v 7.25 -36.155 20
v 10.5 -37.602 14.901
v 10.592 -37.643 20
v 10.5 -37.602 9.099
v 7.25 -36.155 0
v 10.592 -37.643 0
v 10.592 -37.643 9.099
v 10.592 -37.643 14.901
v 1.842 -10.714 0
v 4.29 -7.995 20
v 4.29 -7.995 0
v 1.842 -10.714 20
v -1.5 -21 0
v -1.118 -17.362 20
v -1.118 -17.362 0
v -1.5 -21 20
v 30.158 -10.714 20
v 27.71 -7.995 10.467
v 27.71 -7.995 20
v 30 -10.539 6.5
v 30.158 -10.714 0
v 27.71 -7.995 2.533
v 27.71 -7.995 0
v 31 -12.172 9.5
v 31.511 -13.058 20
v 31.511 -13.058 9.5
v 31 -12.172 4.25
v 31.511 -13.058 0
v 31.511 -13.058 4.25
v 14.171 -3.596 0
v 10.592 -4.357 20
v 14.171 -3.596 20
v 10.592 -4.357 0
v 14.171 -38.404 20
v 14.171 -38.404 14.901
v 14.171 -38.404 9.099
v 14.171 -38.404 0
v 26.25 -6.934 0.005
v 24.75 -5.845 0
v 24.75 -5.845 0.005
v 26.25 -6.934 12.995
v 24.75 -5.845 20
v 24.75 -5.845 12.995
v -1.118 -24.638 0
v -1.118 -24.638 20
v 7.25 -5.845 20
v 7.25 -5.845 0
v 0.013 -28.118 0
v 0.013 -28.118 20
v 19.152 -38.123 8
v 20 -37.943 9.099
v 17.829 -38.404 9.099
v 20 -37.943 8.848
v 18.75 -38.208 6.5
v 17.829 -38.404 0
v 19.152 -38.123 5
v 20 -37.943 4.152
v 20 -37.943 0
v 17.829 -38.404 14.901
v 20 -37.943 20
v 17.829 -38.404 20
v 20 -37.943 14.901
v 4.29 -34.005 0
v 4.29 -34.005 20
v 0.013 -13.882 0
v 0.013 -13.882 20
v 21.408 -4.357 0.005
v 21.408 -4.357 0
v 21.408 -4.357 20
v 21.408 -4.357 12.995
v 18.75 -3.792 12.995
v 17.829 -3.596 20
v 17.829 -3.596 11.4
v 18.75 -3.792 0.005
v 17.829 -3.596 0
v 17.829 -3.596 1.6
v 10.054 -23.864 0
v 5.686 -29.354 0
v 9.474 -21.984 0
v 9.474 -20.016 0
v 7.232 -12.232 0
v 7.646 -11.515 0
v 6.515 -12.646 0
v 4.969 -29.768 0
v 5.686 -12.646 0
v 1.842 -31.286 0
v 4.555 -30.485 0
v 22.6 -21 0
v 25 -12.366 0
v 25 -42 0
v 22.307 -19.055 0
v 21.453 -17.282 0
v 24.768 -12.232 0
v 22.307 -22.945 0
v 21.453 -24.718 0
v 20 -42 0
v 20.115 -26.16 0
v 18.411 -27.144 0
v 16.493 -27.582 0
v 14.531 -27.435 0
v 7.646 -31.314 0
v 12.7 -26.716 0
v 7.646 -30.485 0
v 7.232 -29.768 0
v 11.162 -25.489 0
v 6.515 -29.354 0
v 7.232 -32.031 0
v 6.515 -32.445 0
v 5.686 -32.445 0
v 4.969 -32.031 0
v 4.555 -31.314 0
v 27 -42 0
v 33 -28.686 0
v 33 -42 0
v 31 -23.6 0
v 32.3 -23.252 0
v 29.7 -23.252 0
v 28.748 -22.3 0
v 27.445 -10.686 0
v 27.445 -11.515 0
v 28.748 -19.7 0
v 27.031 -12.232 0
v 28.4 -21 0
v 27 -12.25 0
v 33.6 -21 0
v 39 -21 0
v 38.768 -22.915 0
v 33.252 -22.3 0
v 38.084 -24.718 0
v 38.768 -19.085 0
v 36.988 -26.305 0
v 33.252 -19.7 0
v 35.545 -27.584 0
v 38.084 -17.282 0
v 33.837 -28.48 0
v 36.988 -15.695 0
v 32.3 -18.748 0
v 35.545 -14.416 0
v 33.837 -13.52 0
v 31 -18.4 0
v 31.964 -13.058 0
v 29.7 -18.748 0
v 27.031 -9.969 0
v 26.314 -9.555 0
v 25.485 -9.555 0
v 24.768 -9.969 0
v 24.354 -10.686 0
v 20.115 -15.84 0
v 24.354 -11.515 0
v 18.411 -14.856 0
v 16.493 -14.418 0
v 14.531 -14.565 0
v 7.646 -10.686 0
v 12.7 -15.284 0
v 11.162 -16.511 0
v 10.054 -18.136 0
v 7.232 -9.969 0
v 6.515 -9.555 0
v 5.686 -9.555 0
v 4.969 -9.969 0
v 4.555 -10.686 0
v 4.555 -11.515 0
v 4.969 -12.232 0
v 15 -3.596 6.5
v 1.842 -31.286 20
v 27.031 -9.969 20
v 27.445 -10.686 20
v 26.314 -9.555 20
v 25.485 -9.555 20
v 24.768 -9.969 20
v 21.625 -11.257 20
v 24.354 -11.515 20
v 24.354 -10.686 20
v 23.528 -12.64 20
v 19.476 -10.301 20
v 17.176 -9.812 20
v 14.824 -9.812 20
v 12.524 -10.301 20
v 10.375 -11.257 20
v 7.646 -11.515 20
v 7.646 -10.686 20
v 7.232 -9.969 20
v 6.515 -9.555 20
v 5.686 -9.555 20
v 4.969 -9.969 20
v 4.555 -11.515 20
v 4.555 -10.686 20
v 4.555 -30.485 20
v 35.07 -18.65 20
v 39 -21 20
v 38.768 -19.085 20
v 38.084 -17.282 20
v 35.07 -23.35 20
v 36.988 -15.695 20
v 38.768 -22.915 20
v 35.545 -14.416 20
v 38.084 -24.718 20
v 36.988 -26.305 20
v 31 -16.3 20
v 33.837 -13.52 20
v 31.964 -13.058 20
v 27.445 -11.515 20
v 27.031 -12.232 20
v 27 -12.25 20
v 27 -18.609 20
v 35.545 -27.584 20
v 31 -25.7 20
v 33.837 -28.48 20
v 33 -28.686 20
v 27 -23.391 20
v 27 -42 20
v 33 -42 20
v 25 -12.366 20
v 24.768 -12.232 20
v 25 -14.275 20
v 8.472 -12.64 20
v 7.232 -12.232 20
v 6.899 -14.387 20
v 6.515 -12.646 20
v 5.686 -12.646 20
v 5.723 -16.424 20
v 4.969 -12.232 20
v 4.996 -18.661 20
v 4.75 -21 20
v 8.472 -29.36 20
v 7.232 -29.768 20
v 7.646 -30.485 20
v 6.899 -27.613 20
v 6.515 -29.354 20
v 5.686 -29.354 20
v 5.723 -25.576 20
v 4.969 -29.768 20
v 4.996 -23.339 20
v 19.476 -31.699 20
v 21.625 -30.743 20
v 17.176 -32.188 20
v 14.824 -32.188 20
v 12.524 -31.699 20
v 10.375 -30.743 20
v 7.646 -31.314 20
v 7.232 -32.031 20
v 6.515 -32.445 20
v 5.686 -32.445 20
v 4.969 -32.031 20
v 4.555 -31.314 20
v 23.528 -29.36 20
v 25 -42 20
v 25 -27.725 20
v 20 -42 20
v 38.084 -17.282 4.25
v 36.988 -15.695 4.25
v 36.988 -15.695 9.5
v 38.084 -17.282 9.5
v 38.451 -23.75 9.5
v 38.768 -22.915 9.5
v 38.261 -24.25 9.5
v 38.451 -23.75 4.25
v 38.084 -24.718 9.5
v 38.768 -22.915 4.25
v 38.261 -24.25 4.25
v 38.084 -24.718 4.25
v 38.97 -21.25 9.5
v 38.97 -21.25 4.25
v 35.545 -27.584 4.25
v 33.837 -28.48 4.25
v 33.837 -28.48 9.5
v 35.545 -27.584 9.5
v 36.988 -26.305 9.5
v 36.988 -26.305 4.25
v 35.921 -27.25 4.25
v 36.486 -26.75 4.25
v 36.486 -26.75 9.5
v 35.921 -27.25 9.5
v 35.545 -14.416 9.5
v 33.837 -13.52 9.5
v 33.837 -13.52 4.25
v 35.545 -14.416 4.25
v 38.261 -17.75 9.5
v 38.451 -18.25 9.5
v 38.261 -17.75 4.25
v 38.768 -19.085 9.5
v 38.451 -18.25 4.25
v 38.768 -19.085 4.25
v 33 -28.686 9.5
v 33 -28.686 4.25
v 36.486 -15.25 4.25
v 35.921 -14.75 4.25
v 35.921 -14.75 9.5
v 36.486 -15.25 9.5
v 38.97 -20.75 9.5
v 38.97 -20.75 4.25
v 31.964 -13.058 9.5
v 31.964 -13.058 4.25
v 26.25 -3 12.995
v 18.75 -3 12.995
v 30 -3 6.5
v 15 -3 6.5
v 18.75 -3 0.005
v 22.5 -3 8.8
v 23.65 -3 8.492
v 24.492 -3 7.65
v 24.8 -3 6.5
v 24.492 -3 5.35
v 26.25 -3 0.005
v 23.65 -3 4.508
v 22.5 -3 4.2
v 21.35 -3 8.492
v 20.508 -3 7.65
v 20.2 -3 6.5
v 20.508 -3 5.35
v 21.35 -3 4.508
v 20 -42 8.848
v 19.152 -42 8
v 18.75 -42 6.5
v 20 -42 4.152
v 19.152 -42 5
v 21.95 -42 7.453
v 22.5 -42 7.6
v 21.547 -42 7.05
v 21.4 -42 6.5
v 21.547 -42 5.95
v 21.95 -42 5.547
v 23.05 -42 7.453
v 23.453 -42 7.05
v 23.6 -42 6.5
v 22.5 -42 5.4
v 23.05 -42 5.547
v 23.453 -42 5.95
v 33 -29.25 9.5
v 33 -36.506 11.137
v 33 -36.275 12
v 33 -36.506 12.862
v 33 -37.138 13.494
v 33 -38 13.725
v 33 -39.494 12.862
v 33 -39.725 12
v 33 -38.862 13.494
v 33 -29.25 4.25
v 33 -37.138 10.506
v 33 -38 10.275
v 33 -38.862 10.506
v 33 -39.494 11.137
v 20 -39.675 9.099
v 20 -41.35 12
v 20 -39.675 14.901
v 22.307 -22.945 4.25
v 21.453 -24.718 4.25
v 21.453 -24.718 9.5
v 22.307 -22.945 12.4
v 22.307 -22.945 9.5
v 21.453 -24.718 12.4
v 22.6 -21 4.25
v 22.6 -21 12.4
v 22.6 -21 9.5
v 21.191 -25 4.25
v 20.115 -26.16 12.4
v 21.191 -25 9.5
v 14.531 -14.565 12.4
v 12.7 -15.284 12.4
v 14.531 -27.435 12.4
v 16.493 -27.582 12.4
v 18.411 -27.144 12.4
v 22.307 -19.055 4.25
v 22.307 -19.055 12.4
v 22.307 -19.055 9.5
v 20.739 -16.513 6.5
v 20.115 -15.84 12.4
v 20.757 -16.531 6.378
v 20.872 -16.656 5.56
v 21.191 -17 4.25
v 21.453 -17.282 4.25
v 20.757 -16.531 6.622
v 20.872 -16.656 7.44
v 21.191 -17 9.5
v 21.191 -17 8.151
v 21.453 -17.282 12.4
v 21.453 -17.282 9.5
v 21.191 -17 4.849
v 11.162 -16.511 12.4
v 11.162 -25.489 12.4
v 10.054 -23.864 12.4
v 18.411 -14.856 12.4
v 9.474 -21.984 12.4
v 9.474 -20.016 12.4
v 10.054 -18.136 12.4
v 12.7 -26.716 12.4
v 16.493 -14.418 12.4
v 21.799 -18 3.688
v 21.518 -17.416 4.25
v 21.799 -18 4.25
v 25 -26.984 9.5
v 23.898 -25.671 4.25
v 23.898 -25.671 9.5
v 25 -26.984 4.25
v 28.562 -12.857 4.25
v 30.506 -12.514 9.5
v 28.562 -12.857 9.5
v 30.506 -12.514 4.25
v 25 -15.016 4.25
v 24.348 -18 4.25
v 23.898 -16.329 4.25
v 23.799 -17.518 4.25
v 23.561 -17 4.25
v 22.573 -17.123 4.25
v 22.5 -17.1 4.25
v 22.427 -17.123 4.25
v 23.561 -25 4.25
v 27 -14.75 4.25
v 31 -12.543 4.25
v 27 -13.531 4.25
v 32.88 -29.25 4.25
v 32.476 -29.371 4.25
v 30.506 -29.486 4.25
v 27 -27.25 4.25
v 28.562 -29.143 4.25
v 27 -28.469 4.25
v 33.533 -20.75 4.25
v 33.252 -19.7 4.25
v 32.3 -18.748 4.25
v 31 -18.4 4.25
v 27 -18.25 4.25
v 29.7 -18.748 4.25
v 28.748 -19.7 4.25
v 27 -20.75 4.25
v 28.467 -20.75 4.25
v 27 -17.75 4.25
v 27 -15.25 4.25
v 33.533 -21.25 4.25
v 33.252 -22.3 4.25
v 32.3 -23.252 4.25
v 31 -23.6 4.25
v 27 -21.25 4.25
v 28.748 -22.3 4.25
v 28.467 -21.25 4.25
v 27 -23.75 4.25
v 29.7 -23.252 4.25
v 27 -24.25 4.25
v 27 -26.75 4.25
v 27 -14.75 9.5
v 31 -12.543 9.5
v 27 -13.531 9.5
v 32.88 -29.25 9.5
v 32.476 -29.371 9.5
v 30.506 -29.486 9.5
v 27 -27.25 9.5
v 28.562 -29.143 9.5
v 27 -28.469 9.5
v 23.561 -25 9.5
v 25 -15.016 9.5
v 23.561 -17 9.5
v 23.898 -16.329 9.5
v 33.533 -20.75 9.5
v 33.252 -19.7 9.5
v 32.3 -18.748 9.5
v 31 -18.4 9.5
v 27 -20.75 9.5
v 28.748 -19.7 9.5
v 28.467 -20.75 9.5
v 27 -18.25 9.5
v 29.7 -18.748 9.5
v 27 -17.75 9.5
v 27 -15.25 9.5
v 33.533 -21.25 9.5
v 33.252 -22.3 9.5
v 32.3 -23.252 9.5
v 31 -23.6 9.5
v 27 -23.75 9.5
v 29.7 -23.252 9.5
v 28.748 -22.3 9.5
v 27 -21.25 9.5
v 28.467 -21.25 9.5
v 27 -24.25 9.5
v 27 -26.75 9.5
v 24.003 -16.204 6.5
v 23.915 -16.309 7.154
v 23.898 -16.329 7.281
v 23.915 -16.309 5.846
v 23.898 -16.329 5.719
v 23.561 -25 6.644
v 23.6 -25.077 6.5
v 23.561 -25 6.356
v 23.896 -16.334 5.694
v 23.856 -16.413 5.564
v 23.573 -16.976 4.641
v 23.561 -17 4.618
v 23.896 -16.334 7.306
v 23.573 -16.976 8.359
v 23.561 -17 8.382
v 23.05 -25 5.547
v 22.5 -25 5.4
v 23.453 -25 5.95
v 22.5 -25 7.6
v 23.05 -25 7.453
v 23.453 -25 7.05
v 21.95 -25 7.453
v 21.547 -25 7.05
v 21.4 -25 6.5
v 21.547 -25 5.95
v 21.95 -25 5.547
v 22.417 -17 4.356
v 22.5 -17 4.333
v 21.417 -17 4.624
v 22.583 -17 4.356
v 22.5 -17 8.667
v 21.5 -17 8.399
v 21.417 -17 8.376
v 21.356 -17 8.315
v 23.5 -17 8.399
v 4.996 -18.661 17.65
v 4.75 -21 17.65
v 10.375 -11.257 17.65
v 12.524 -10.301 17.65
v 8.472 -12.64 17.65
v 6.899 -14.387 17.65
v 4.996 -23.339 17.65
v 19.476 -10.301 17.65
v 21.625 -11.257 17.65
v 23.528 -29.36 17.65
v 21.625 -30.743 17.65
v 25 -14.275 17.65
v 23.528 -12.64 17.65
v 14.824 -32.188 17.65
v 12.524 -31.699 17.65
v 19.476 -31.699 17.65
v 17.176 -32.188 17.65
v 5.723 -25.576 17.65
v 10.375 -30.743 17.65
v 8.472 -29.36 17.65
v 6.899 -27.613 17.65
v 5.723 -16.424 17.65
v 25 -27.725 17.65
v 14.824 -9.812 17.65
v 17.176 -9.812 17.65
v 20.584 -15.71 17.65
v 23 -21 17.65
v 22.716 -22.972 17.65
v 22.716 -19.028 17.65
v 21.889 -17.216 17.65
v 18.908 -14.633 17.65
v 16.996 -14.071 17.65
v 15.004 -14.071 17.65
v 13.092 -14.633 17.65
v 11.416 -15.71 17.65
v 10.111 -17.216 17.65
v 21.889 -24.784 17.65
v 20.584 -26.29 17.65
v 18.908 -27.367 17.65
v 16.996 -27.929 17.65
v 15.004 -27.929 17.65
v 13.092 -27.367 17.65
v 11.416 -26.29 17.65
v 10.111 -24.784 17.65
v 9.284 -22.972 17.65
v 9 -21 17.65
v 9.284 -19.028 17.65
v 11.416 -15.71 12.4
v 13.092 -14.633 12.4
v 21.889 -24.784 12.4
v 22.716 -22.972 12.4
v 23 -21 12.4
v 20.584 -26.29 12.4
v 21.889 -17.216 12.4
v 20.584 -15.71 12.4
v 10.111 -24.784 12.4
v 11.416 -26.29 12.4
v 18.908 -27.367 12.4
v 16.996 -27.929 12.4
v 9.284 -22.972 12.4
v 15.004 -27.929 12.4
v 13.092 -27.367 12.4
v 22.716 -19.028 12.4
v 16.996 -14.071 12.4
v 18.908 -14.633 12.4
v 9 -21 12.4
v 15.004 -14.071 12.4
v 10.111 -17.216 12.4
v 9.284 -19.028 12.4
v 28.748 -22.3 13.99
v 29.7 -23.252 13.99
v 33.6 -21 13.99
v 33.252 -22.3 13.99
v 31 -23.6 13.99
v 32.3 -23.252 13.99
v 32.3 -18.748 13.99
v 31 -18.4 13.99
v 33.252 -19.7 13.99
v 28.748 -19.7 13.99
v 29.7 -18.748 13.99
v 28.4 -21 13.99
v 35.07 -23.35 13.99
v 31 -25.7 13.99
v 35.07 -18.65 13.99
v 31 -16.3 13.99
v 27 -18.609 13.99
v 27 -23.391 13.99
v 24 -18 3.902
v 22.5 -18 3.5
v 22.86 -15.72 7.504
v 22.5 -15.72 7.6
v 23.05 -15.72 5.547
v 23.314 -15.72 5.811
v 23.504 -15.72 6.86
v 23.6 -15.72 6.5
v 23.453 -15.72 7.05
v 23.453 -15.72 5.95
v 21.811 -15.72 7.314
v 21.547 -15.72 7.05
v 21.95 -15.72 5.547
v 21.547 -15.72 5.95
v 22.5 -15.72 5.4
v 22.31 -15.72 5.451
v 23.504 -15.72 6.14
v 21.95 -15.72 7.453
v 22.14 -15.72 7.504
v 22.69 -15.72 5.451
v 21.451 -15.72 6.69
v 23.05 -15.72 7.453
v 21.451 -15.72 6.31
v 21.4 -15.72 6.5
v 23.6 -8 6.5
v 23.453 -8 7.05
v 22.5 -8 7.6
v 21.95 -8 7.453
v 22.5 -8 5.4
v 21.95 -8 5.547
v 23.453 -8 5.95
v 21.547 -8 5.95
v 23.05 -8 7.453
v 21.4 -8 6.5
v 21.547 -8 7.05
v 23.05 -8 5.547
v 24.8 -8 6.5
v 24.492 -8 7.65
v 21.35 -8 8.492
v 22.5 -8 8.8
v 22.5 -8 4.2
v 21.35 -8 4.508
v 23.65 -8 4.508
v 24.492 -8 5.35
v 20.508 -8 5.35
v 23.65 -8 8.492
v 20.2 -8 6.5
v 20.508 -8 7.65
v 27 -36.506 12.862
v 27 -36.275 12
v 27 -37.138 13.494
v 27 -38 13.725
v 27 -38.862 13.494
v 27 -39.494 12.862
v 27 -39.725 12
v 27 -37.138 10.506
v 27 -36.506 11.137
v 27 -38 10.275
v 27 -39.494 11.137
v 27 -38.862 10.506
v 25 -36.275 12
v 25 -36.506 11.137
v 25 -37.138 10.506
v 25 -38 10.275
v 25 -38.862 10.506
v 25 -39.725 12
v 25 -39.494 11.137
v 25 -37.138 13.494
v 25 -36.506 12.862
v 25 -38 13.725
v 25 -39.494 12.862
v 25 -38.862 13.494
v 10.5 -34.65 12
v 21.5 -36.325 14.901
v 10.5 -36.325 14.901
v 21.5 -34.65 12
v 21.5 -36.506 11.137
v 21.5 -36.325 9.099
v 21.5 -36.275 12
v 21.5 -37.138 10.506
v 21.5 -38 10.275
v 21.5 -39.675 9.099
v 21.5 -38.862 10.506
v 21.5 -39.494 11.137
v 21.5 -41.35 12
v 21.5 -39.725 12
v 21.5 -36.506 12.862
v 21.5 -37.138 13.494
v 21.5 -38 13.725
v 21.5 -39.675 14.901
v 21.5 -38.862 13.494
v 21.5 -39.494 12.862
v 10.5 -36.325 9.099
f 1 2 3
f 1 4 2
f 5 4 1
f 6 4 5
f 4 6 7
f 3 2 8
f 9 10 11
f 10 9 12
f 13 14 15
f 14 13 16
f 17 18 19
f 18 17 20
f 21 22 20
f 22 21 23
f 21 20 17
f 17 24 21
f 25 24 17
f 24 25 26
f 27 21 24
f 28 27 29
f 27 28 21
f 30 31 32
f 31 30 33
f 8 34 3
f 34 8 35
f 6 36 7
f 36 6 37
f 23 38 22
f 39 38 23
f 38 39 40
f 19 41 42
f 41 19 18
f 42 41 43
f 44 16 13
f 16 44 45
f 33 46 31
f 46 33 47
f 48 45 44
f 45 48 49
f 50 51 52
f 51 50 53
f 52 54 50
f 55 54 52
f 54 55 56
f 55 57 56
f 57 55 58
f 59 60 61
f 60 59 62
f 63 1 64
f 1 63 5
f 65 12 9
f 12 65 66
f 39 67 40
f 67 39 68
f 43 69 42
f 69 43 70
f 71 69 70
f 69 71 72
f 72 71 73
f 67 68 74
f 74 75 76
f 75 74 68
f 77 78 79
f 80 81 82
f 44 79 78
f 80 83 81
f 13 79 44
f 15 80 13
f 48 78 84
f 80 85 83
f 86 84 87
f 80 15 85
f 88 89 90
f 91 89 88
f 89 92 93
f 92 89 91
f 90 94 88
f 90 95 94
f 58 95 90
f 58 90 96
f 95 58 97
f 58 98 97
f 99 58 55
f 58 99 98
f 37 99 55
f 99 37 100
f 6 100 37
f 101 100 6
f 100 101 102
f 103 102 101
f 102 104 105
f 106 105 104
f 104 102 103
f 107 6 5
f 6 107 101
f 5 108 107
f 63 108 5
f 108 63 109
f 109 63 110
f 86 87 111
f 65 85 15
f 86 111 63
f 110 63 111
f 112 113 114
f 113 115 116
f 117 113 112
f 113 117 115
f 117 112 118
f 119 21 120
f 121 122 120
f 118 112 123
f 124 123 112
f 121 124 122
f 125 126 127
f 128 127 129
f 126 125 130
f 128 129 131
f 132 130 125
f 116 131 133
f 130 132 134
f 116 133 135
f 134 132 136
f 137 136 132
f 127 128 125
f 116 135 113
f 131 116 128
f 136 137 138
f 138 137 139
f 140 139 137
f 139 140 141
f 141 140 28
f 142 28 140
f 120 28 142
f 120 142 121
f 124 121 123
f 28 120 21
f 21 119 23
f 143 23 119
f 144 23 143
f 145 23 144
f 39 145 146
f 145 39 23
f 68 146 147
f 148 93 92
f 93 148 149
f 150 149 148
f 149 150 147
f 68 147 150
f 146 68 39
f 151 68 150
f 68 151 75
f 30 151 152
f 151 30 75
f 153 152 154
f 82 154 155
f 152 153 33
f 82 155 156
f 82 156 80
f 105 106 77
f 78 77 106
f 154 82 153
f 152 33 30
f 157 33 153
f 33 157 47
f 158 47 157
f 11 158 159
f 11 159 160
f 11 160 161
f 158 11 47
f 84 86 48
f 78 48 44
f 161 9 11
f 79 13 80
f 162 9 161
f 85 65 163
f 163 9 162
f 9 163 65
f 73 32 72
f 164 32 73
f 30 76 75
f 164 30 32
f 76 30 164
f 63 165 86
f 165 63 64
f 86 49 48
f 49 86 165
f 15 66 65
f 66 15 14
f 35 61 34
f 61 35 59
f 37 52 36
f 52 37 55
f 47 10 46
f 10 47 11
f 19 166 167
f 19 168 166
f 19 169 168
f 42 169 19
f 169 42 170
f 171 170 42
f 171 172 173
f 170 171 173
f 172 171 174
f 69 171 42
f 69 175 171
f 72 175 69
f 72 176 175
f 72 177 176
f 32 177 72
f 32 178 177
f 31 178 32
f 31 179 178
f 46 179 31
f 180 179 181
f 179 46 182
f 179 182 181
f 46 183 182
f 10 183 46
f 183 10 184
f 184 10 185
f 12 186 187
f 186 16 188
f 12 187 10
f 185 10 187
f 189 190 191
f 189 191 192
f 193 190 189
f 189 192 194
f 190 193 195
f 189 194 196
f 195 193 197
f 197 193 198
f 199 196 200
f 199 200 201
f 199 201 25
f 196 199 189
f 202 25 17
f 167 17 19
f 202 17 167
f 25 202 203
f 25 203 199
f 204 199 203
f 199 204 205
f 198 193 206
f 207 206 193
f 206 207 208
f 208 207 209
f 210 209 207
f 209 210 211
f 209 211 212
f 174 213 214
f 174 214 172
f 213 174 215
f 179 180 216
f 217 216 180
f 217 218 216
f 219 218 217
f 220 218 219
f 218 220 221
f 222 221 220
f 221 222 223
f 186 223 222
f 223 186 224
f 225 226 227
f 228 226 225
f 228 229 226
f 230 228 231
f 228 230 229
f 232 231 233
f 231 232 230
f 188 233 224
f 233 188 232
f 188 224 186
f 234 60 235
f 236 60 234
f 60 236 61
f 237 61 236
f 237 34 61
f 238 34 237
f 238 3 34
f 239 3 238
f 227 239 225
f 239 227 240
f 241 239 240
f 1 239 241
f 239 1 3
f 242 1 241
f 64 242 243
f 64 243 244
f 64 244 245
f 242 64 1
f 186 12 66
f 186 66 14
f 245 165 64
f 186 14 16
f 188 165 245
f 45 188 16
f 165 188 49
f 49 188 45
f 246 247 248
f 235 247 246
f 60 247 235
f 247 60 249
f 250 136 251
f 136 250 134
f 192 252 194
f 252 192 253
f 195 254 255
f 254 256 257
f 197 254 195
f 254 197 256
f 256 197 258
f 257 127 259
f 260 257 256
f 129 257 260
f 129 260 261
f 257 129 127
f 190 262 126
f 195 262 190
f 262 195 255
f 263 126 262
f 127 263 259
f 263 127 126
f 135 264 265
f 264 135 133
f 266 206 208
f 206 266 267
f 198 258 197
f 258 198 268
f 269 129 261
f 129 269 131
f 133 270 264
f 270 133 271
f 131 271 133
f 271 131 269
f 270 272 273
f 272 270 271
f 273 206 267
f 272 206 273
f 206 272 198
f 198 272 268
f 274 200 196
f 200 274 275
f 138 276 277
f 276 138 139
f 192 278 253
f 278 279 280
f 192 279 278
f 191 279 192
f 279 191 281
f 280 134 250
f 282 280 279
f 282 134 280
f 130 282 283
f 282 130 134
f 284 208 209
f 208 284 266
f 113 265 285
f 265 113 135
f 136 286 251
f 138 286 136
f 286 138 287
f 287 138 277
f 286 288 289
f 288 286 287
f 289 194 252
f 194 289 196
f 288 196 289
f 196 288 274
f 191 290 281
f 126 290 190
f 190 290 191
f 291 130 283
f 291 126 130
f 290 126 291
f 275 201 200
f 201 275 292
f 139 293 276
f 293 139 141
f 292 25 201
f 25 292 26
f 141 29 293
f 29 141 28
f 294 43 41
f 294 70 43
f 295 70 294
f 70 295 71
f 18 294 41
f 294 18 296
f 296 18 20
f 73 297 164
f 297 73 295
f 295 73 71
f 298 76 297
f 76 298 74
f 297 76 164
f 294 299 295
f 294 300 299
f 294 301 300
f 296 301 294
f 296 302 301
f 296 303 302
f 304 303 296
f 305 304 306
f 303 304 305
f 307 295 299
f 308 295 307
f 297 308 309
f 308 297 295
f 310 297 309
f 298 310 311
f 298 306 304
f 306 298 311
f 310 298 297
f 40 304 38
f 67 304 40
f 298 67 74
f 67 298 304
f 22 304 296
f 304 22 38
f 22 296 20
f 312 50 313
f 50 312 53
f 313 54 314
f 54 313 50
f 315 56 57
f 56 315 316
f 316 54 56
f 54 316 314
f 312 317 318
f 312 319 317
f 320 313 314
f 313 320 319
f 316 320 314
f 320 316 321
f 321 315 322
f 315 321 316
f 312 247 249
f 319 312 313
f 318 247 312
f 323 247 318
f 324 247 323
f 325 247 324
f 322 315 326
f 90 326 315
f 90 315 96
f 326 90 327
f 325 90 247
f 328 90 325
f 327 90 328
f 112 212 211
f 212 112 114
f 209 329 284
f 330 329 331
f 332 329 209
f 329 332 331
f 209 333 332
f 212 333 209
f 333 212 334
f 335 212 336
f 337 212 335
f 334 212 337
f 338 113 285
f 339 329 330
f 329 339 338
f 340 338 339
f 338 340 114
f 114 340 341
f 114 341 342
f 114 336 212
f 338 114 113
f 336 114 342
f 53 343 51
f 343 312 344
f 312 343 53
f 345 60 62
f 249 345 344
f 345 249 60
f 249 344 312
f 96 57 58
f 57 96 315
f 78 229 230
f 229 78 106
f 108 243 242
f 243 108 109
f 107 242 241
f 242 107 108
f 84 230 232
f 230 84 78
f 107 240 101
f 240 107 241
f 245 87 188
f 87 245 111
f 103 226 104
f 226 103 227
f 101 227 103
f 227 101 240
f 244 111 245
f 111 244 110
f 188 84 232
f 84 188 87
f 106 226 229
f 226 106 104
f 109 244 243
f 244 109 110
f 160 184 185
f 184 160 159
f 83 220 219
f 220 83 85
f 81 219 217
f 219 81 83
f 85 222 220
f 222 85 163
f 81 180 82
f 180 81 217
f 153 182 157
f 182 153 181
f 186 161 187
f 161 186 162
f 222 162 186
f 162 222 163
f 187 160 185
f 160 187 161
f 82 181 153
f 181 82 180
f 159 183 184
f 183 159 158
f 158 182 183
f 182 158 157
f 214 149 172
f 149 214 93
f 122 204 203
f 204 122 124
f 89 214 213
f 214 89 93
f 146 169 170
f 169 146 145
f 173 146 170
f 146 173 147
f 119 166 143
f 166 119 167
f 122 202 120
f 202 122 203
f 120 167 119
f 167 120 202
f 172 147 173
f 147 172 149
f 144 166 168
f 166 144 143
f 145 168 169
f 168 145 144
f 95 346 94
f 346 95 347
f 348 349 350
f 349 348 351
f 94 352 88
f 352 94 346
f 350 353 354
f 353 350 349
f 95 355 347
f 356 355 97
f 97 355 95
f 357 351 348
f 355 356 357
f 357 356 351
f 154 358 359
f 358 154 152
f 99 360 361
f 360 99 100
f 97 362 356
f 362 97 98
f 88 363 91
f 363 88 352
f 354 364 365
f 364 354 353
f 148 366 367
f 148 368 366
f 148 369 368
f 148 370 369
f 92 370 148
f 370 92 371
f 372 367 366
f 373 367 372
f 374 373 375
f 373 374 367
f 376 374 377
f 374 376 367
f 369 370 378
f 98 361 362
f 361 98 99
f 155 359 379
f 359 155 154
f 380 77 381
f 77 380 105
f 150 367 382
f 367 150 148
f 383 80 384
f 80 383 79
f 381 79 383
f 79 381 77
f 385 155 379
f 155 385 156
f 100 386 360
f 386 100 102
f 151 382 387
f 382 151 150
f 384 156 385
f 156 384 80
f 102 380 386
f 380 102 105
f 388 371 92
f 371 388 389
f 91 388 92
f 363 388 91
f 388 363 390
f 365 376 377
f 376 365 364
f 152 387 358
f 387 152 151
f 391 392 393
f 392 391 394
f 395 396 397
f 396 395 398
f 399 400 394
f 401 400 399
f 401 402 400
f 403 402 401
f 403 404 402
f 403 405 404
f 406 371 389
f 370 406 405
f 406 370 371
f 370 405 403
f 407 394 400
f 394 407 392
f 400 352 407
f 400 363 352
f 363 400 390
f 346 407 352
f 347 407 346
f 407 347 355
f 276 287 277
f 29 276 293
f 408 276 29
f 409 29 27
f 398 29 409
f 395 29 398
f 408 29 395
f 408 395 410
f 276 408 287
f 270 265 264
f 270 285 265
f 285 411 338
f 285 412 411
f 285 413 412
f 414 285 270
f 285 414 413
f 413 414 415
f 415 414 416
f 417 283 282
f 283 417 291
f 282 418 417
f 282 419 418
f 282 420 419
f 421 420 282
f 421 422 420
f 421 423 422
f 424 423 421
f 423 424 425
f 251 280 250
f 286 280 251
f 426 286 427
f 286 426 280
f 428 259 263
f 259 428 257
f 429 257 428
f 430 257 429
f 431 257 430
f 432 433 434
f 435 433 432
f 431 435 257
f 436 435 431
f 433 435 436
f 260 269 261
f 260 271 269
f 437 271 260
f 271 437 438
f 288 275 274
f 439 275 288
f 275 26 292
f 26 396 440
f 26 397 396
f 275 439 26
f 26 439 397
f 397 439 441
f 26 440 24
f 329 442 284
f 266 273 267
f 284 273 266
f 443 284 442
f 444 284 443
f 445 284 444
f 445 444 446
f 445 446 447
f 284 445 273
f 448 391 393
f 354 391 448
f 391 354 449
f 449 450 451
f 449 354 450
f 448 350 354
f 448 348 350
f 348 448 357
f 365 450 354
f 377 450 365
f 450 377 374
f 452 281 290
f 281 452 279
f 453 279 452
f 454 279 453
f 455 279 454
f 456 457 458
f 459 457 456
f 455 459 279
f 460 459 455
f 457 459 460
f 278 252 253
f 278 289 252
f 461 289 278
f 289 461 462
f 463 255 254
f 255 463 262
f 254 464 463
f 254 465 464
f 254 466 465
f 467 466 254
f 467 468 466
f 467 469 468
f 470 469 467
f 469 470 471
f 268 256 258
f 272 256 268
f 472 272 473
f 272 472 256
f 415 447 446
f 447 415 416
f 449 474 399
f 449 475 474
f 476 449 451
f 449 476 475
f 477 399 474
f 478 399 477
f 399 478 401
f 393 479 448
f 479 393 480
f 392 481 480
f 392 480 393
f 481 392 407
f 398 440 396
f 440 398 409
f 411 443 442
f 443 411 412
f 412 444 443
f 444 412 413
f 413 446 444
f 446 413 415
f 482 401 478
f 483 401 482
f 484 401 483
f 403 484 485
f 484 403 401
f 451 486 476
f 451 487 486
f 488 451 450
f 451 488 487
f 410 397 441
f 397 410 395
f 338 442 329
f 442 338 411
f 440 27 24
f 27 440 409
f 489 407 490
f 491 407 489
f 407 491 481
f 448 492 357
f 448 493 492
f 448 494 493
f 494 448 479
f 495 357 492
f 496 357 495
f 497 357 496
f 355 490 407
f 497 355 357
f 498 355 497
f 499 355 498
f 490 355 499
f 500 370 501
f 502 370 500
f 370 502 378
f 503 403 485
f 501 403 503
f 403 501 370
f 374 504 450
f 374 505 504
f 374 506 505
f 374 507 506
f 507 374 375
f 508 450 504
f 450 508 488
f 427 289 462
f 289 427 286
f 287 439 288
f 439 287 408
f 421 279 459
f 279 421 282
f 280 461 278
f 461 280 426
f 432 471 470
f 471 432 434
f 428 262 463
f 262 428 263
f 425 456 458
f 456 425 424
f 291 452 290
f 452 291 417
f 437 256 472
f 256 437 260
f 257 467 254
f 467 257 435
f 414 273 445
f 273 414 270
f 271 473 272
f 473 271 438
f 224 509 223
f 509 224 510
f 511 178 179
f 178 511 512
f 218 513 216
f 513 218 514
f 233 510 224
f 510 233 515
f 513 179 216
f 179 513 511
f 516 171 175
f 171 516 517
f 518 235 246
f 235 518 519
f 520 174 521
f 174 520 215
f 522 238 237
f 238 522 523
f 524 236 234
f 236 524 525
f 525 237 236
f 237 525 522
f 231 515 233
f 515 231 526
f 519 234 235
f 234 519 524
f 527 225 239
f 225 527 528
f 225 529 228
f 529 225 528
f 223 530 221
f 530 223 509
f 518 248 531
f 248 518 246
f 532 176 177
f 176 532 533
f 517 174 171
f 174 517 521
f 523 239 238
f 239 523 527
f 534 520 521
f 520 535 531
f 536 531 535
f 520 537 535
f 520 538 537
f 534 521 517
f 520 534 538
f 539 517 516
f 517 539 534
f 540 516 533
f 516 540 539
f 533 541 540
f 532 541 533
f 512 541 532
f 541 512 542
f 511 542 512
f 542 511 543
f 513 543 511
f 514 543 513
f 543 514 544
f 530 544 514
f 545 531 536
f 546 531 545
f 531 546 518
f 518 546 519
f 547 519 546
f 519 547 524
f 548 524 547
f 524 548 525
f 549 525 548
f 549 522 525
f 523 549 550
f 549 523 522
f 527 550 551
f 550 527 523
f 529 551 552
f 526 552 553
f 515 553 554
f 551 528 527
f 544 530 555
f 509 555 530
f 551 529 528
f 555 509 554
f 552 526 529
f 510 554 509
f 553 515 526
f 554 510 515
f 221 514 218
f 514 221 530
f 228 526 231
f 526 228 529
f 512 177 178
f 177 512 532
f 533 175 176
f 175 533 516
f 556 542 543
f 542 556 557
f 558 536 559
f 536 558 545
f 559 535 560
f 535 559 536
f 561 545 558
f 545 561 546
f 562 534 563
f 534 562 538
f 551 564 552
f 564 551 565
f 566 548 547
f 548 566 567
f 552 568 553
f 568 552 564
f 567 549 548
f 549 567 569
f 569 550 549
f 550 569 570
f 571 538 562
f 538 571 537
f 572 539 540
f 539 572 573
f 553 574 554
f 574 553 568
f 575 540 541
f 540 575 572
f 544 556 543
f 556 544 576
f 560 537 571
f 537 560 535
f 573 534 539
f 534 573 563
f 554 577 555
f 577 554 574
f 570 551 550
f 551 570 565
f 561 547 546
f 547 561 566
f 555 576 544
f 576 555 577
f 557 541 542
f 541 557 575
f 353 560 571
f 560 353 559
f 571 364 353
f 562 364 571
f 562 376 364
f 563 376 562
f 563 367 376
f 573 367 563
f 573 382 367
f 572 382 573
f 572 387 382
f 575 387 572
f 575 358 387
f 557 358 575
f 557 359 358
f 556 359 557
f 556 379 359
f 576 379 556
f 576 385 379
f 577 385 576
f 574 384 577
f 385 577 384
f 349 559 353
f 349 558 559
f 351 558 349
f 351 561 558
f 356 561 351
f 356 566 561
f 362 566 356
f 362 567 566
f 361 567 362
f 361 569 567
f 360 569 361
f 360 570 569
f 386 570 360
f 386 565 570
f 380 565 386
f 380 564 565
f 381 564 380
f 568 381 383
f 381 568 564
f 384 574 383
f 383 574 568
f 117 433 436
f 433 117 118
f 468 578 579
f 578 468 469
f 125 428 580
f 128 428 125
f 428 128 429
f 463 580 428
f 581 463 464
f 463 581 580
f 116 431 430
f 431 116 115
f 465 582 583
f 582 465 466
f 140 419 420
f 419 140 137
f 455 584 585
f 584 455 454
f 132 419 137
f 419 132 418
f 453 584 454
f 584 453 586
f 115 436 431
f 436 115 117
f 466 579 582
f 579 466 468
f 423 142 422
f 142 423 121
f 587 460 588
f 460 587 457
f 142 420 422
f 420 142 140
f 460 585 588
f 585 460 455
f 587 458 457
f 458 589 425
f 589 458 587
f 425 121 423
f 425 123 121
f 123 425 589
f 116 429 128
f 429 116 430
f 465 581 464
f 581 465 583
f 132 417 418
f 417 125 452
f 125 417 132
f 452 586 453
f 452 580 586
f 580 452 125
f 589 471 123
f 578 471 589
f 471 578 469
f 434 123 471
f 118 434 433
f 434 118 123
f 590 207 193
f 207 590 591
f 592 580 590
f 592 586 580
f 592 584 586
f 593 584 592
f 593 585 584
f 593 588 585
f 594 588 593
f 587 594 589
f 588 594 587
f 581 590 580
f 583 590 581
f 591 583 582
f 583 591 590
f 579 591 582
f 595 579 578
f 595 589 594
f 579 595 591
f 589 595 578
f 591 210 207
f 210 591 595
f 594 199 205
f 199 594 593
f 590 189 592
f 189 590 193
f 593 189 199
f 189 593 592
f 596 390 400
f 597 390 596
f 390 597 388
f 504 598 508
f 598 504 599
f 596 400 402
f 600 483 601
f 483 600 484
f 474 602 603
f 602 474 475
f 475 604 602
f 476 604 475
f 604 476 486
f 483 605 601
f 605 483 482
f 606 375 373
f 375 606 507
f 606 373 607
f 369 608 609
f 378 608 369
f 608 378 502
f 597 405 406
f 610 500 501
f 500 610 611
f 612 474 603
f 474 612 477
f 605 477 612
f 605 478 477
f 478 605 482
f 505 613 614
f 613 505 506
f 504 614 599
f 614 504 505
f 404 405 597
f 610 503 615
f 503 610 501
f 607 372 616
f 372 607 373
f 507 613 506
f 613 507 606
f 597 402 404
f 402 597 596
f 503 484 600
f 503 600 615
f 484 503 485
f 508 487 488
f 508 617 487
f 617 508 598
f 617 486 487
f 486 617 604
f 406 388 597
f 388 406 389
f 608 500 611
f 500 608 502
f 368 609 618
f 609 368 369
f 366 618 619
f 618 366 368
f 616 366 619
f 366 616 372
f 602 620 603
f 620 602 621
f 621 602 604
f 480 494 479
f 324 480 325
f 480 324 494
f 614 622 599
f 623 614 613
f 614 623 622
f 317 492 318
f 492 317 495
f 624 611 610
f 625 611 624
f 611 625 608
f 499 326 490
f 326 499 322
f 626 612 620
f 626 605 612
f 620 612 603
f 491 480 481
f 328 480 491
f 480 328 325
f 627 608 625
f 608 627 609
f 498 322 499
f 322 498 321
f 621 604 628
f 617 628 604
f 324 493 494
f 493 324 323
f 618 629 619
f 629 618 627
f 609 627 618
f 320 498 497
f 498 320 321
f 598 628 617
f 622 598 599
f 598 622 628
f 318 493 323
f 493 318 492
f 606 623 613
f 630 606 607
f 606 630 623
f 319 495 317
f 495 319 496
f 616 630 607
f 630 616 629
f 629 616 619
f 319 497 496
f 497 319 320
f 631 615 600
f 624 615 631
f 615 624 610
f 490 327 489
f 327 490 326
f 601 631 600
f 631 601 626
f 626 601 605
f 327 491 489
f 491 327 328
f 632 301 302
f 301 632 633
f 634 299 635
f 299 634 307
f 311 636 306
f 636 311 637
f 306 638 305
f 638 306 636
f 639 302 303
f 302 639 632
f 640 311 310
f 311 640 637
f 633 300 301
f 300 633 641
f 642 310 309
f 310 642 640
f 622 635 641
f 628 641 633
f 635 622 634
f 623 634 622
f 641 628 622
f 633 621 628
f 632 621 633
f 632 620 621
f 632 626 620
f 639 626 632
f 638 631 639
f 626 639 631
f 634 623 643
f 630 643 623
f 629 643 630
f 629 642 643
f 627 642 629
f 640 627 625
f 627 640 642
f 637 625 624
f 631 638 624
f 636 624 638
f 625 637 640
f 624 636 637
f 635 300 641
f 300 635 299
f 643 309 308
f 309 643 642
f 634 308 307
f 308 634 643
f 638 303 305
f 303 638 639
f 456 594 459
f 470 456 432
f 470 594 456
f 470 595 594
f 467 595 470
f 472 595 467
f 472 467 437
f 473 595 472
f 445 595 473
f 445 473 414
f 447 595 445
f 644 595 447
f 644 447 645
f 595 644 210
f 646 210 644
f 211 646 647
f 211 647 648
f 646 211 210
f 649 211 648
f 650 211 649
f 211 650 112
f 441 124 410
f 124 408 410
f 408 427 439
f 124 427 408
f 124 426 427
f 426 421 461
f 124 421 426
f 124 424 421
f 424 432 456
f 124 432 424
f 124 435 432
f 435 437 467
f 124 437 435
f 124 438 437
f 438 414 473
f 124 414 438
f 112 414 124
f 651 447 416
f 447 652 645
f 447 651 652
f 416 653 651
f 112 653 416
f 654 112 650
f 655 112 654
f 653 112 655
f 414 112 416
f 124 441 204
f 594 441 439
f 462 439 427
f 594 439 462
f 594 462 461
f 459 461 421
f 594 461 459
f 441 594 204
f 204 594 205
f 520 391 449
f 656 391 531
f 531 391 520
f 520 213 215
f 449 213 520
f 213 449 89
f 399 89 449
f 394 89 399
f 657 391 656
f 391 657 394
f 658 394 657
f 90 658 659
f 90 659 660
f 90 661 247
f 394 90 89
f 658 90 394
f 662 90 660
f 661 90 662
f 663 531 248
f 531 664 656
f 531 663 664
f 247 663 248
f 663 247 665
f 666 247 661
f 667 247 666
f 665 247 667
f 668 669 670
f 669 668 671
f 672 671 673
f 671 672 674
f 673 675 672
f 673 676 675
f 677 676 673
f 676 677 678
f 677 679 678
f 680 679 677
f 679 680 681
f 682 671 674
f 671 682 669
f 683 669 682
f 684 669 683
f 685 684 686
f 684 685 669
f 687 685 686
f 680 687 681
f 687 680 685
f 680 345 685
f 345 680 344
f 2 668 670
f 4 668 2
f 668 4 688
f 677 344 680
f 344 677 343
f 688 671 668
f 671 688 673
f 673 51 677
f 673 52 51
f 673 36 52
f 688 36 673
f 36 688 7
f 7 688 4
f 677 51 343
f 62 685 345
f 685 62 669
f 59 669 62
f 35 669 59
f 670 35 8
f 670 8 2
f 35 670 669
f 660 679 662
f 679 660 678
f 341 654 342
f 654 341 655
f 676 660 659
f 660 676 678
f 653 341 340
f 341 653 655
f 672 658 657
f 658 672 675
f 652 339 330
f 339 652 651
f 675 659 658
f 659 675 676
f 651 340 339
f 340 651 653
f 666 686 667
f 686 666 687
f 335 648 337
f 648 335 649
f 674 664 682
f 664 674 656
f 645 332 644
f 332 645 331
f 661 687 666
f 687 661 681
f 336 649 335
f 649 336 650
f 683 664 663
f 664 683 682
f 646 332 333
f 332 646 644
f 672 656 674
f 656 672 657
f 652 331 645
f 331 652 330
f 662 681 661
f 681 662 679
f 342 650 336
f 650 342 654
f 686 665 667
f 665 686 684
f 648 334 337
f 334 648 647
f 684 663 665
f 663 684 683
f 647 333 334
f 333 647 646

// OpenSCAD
// file: ../include/configuration.scad
// Increase this if your slicer or printer make holes too tight.
extra_radius = 0.1;

// OD = outside diameter, corner to corner.
m3_nut_od = 6.1;
m3_nut_radius = m3_nut_od/2 + 0.2 + extra_radius;
m3_washer_radius = 3.5 + extra_radius;

// Major diameter of metric 3mm thread.
m3_major = 2.85;
m3_radius = m3_major/2 + extra_radius;
m3_wide_radius = m3_major/2 + extra_radius + 0.2;

// NEMA17 stepper motors.
motor_shaft_diameter = 5;
motor_shaft_radius = motor_shaft_diameter/2 + extra_radius;

// Frame brackets. M3x8mm screws work best with 3.6 mm brackets.
thickness = 3.6;

// OpenBeam or Misumi. Currently only 15x15 mm, but there is a plan
// to make models more parametric and allow 20x20 mm in the future.
extrusion = 15;

// Placement for the NEMA17 stepper motors.
motor_offset = 44;
motor_length = 47;
// main file
// Based on "Makergear Filament drive goes Bowden" by Luke321
// http://www.thingiverse.com/thing:63674

include <../include/configuration.scad>;

filament_offset = 22.5;

module extruder() {
  rotate([90, 0, 0]) difference() {
    union() {
      //main cylinder
      translate([16,20,21]) rotate([90,0,0]) cylinder(h=20, r=17.5);

      //bearing mount
      translate([31,20,21]) rotate([90,0,0]) cylinder (h=20, r=8);

      //pushfit/pneufit mount
      translate([filament_offset, 6.5, 13])
        cylinder(r=7.5, h=20, center=true, $fn=6);

      //filament support
      translate([21.75,6.5,34]) rotate([0,0,0]) cylinder (h=8, r=3, $fn=12);

      //clamp
      translate([20, 0, 28]) cube([13, 20, 14]);
    }

    //pulley opening
    translate([16,21,21]) rotate([90,0,0]){
      cylinder (h=22, r=6.6);

      rotate([0,0,45]) {
        //translate([14,0,0]) cylinder(h=22, r=1.6, $fn=12);
        translate([0,14,0]) cylinder(h=22, r=1.6, $fn=12);
        translate([-14,0,0]) cylinder(h=22, r=1.6, $fn=12);
        translate([0,-14,0]) cylinder(h=22, r=1.6, $fn=12);
      }
    }

    //gearhead indentation
    translate([16,21,21]) rotate([90,0,0]) cylinder (h=3.35, r=11.25);

    //pulley hub indentation
    translate([16,20-2,21]) rotate([90,0,0]) cylinder (h=5.6, r=7);

    //bearing screws
    translate([31,21,21]) rotate([90,0,0]) cylinder (h=22, r=2.6, $fn=12);
    #translate([31,22,21]) rotate([90,30,0]) cylinder (h=8.01, r=4.7, $fn=6);

    //bearing
    difference() {
      union() {
        translate([31,9.5,21]) rotate([90,0,0]) cylinder (h=5.25, r=8.5);
        translate([31,9.5-5.25,21-8.25-2]) cube([20, 5.25, 18.5]);
        //opening between bearing and pulley
        translate([20,9.5-5.25,21-8.25+3.25+1]) cube([10, 5.25, 8]);
      }
      //removable supports
      for (z = [15:3:27]) {
        translate([36, 10, z]) # cube([20, 20, 0.5], center=true);
      }
    }

    //filament path chamfer
    translate([filament_offset,6.5,15]) rotate([0,0,0]) #
      cylinder(h=3, r1=0.5, r2=3, $fn=12);

    //filament path
    translate([filament_offset,6.5,-10]) rotate([0,0,0]) #
      cylinder(h=60, r=1.1, $fn=12);

    //pushfit/pneufit mount
    translate([filament_offset, 6.5, 0]) # cylinder(r=2.3, h=8, $fn=12);

    //clamp slit
    translate([25,-1,10]) cube([2, 22, 35]);
    //clamp nut
    translate([10.5,12,38]) rotate([0,90,0])
      cylinder(h=11, r=m3_nut_radius, $fn=6);
    //clamp screw hole
    translate([15,12,38]) rotate([0,90,0])
      cylinder(h=20, r=m3_wide_radius, $fn=12);
  }
}

extruder();
